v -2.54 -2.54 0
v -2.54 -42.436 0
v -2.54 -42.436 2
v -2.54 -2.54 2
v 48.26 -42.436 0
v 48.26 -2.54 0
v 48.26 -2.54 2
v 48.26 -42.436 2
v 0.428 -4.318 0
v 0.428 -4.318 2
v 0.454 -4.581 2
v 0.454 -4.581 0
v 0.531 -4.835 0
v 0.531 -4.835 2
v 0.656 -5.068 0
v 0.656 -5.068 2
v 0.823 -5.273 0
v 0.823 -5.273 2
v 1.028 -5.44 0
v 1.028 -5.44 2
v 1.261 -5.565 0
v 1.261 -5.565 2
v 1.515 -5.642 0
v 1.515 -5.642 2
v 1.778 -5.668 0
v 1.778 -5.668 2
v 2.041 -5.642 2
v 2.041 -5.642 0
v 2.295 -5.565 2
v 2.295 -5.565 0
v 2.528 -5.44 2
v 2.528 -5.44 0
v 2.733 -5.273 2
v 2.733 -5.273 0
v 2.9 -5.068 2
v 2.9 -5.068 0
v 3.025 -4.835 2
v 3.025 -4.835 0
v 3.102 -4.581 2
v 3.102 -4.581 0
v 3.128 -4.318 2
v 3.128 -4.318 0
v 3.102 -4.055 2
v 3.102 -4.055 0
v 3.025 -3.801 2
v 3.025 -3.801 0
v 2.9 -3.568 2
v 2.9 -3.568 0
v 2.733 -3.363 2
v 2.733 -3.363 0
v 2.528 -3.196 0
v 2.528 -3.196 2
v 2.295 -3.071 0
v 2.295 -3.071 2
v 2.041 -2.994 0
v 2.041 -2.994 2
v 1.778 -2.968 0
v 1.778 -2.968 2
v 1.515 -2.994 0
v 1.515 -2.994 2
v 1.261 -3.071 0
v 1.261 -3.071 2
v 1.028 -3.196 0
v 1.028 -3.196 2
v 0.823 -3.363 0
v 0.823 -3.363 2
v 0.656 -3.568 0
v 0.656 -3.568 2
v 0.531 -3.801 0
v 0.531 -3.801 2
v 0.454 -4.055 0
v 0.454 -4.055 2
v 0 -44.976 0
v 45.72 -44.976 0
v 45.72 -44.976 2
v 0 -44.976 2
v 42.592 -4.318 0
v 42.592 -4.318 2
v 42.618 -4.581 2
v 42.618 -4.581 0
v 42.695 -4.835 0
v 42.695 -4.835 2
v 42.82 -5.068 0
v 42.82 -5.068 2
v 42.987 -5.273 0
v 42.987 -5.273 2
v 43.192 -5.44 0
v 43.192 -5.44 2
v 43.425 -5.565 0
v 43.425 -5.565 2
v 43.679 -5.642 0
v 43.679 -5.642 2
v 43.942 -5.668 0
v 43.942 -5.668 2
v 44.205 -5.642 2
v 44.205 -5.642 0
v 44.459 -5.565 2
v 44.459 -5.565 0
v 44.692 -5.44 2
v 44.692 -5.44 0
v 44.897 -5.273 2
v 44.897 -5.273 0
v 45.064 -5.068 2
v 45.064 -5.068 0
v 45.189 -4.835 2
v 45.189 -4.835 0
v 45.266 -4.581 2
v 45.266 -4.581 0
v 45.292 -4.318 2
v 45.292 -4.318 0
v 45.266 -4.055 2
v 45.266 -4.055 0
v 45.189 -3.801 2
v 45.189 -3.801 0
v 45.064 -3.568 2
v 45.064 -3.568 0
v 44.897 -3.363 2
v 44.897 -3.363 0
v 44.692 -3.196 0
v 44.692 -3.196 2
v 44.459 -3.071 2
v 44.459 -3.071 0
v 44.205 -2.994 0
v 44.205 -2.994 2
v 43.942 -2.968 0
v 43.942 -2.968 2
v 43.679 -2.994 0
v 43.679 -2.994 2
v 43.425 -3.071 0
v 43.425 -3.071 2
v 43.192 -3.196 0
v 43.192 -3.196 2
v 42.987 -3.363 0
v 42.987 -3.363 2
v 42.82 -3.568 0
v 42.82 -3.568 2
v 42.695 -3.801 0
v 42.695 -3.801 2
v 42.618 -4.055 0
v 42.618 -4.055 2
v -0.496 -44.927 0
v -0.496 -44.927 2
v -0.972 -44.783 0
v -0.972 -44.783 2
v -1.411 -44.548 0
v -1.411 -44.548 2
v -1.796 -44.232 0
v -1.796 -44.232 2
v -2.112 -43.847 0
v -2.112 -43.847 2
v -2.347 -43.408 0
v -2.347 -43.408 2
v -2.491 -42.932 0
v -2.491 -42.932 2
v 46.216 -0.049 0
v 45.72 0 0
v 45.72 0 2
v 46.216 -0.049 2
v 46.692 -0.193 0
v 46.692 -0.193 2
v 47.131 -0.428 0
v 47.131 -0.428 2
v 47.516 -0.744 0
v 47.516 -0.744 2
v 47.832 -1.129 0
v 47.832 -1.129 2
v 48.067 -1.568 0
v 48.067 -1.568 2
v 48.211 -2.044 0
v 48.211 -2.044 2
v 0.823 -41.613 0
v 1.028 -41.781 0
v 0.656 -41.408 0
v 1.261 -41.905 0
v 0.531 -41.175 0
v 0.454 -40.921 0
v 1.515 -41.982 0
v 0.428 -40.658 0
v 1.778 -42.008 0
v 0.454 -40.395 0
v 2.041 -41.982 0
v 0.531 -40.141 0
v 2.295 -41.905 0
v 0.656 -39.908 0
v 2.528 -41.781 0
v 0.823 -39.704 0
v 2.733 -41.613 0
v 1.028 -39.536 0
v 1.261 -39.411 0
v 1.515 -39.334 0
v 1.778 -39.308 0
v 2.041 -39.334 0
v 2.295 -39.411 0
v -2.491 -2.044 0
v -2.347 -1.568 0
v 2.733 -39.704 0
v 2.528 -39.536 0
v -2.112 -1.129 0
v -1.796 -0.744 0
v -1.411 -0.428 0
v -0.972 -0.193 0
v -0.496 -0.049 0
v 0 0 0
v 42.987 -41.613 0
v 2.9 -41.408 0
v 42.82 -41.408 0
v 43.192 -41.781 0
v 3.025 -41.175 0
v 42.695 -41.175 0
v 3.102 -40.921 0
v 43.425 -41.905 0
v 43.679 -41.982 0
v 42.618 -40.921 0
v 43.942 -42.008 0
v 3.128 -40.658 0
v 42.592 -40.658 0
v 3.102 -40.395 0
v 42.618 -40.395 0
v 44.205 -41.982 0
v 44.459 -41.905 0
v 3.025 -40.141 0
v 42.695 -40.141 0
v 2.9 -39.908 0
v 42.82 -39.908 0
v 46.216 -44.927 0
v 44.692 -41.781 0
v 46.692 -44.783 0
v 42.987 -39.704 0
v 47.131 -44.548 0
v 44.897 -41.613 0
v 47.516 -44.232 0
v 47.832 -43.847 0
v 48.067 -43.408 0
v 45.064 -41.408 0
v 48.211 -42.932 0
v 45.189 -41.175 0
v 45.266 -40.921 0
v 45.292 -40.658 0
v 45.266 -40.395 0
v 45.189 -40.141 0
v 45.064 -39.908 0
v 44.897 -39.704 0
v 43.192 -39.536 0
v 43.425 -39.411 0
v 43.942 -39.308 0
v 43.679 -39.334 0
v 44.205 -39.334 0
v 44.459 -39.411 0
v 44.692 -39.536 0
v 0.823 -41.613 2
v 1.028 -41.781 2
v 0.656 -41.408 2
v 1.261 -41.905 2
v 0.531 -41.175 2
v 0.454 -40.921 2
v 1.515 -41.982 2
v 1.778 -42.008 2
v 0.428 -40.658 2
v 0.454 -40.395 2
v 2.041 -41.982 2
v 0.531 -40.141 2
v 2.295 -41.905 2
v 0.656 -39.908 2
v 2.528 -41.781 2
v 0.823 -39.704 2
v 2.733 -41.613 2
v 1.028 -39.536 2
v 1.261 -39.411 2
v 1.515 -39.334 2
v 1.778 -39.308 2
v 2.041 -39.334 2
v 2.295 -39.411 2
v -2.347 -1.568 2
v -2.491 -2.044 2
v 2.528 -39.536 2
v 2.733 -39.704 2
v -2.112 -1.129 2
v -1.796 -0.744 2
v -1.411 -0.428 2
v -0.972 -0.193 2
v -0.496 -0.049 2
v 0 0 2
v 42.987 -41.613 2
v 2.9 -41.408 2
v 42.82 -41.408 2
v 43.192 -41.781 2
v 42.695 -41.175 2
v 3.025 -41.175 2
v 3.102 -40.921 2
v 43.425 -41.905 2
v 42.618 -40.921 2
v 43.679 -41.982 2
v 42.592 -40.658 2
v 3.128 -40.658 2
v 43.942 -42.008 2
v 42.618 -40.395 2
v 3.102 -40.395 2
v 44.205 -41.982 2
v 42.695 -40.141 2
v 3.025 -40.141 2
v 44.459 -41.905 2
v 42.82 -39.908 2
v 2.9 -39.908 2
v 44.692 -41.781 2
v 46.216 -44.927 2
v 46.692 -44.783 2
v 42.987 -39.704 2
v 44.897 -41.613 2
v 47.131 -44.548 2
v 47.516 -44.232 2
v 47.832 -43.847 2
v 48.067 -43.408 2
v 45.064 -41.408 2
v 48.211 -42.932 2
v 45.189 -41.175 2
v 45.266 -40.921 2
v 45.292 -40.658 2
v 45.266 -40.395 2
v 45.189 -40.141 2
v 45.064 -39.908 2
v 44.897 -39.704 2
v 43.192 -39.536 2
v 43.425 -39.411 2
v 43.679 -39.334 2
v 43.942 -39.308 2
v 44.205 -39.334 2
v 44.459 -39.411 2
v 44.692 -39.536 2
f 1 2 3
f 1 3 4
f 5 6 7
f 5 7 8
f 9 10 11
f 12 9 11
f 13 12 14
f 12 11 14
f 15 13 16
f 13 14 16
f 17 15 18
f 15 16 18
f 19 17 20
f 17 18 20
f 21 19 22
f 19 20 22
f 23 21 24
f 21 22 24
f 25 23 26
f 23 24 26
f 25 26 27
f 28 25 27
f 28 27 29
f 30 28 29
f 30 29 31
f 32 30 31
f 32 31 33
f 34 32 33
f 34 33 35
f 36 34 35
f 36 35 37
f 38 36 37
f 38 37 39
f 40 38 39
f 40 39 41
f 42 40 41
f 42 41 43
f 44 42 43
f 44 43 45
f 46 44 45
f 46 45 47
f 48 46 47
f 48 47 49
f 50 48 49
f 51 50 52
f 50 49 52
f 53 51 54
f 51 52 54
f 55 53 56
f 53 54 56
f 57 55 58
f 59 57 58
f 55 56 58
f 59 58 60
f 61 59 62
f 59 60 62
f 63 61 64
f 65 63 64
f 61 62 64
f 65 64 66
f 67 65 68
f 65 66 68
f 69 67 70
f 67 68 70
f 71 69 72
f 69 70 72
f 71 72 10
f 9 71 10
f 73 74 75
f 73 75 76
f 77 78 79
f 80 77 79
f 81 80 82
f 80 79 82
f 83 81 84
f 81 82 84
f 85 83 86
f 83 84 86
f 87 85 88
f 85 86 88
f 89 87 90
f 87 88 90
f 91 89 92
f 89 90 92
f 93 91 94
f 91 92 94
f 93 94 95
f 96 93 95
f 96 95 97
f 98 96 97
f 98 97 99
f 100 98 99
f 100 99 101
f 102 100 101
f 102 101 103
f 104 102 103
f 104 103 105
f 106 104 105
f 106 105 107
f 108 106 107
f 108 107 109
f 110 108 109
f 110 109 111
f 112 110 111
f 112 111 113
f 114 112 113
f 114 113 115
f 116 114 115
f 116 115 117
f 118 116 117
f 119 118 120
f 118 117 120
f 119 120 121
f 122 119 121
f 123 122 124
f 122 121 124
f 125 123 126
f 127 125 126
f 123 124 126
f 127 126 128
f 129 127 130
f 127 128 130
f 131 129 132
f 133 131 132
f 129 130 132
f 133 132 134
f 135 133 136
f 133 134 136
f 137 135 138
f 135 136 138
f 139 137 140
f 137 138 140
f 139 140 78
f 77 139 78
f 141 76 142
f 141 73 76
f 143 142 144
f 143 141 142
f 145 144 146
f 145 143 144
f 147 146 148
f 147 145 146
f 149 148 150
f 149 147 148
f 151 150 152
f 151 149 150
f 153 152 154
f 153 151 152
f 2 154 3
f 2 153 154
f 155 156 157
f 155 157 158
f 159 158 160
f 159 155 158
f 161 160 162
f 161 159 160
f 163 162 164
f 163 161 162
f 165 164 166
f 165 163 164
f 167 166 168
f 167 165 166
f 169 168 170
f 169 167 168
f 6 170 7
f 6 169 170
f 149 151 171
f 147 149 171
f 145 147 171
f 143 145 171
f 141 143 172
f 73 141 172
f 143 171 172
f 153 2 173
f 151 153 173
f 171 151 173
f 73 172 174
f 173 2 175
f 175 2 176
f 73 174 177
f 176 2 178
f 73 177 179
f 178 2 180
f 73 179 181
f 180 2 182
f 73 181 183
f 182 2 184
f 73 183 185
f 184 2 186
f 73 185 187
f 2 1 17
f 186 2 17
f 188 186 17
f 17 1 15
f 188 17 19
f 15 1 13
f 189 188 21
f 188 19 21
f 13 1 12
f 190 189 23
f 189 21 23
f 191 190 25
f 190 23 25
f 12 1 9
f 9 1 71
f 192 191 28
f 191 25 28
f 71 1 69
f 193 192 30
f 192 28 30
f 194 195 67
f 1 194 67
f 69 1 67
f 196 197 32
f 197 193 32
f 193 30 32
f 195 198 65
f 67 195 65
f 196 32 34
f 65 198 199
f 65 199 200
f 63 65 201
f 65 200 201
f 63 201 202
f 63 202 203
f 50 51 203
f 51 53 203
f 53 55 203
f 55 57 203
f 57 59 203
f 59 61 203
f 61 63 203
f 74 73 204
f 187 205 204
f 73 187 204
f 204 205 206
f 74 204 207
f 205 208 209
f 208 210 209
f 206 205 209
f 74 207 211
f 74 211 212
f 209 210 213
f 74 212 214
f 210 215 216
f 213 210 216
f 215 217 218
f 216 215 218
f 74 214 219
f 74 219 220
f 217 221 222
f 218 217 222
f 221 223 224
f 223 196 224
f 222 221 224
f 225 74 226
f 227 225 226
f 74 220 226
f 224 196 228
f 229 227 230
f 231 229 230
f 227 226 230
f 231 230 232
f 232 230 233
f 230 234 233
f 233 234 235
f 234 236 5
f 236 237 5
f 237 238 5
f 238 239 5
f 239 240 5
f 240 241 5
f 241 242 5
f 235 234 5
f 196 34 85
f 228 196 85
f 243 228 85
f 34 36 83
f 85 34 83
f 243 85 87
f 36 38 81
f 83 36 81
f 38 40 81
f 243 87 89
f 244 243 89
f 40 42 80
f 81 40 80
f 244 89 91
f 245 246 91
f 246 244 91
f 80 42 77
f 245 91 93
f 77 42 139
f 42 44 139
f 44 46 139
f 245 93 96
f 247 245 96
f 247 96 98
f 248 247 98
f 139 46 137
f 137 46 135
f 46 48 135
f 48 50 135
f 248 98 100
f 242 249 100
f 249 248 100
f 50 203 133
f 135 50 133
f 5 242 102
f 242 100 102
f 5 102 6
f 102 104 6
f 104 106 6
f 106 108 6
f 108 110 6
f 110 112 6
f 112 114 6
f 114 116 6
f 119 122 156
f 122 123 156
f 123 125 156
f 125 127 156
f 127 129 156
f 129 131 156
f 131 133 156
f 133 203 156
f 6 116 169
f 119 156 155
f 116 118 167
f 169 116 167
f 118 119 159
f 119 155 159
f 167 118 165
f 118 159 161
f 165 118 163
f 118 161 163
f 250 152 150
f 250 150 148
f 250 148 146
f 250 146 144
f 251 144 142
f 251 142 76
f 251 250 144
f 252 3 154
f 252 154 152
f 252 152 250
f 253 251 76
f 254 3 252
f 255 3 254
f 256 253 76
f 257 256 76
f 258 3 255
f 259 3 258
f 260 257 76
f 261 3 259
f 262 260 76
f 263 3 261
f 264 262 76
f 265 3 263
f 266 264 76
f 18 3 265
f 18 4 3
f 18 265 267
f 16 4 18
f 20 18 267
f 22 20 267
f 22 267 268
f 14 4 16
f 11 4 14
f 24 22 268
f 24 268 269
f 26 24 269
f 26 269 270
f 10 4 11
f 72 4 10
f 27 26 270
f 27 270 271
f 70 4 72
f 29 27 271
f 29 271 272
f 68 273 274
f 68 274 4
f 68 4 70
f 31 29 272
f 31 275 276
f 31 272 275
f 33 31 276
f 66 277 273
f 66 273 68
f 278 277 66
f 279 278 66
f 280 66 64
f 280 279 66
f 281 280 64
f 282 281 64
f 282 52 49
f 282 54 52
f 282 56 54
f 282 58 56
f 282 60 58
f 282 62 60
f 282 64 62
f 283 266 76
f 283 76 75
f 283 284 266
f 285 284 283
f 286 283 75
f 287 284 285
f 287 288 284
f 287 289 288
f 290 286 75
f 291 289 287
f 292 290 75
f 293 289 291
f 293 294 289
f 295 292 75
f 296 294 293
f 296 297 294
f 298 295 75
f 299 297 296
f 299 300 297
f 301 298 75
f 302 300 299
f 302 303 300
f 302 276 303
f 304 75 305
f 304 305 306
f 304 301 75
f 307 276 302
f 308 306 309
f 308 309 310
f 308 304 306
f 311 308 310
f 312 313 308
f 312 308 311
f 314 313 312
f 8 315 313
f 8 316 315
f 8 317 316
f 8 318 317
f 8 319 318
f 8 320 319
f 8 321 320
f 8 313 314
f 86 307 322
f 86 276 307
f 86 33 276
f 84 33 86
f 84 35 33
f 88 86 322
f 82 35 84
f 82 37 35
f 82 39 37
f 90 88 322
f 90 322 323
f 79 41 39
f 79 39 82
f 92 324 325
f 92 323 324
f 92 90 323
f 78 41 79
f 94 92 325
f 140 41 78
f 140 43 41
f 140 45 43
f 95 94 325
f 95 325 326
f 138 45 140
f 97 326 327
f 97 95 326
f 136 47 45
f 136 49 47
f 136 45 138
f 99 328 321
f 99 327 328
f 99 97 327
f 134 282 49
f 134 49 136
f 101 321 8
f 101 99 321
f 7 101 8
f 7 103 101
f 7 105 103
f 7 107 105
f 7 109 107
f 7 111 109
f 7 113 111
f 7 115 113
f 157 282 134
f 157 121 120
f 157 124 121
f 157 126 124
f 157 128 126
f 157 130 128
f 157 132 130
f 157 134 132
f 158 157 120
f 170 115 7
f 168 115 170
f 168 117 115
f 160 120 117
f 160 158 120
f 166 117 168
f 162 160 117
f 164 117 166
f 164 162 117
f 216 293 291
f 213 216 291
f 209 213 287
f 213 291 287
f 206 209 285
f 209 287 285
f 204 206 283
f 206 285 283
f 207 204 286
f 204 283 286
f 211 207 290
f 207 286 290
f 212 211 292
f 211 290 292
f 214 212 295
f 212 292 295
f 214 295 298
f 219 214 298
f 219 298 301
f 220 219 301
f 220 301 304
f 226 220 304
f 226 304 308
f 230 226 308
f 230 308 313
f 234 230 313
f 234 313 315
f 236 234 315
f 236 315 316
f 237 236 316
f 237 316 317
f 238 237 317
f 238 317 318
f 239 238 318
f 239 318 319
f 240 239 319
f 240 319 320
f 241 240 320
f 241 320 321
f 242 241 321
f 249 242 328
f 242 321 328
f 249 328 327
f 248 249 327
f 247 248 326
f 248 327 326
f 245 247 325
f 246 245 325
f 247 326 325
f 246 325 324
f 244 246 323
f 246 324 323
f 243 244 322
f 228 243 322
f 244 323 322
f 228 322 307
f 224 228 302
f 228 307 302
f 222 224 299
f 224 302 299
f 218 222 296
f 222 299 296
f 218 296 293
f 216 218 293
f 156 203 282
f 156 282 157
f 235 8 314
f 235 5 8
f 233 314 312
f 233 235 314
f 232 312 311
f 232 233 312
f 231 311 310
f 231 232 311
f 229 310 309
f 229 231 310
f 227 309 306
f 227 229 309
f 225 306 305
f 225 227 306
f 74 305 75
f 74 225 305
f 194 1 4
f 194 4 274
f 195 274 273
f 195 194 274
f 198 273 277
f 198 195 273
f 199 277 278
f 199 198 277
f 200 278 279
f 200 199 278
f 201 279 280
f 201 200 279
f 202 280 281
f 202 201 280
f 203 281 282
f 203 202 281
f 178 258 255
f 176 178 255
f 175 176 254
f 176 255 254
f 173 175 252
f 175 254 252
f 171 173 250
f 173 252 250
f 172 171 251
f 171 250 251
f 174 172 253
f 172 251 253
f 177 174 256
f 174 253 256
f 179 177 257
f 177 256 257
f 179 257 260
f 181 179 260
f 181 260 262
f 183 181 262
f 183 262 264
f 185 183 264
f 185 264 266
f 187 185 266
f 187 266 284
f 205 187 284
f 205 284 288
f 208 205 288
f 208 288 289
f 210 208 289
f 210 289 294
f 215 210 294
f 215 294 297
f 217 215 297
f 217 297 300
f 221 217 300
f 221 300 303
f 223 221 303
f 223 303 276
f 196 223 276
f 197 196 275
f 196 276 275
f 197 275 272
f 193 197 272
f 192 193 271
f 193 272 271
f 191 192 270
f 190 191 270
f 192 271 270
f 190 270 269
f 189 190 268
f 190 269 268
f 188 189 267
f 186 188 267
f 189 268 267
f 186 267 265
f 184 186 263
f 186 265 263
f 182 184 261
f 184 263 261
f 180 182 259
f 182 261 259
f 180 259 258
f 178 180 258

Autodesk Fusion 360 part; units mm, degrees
sketch "Sketch10" plane through (0, 0, 0) normal (0, 0, 1) x (1, 0, 0)
  line L0 (0, 0) -> (45.72, 0)
  arc A0 (48.26, -2.54) -> (45.72, 0) centre (45.72, -2.54) ccw
  line L1 (45.72, -2.54) -> (48.26, -2.54) construction
  line L2 (45.72, -2.54) -> (45.72, 0) construction
  line L3 (48.26, -2.54) -> (48.26, -42.4361)
  arc A1 (48.26, -2.54) -> (45.72, 0) centre (45.72, -2.54) ccw
  arc A2 (45.72, -44.9761) -> (48.26, -42.4361) centre (45.72, -42.4361) ccw
  line L4 (0, -42.4361) -> (-2.54, -42.4361) construction
  line L5 (45.72, -44.9761) -> (0, -44.9761)
  arc A3 (-2.54, -42.4361) -> (0, -44.9761) centre (0, -42.4361) ccw
  arc A4 (-2.54, -42.4361) -> (0, -44.9761) centre (0, -42.4361) ccw
  line L6 (0, -42.4361) -> (0, -44.9761) construction
  arc A5 (0, 0) -> (-2.54, -2.54) centre (0, -2.54) ccw
  line L7 (-2.54, -42.4361) -> (-2.54, -2.54)
  point P0 (45.72, -44.9761)
  dimension "d5" = 45.72
  dimension "d7" = 2.54
  dimension "d8" = 90
  dimension "d9" = 39.8961
  dimension "d10" = 2.54
  dimension "d11" = 2.54
  dimension "d12" = 45.72
  dimension "d13" = 2.54
  dimension "d14" = 90
  dimension "d15" = 39.8961
  dimension "d16" = 2.54
  dimension "d17" = 2.54
extrude "Extrude3" add sketch "Sketch10" along normal blind 2
sketch "Sketch11" plane through (0, 0, 2) normal (0, 0, 1) x (-1, 0, 0)
  arc A0 (-45.72, 44.9761) -> (-48.26, 42.4361) centre (-45.72, 42.4361) ccw
  line L0 (-48.26, 42.4361) -> (-48.26, 2.54)
  arc A1 (-48.26, 2.54) -> (-45.72, 0) centre (-45.72, 2.54) ccw
  line L1 (-45.72, 0) -> (0, 0)
  arc A2 (0, 0) -> (2.54, 2.54) centre (0, 2.54) ccw
  line L2 (2.54, 2.54) -> (2.54, 42.4361)
  arc A3 (2.54, 42.4361) -> (0, 44.9761) centre (0, 42.4361) ccw
  line L3 (0, 44.9761) -> (-45.72, 44.9761)
  circle A4 centre (-1.778, 4.318) radius 1.35
  dimension "d22" = 2.7
extrude "Extrude4" cut sketch "Sketch11" against normal blind 4 contours A4
sketch "Sketch12" plane through (0, 0, 2) normal (0, 0, 1) x (-1, 0, 0)
  circle A0 centre (-1.778, 4.318) radius 1.35
  arc A1 (-45.72, 44.9761) -> (-48.26, 42.4361) centre (-45.72, 42.4361) ccw
  line L0 (-48.26, 42.4361) -> (-48.26, 2.54)
  arc A2 (-48.26, 2.54) -> (-45.72, 0) centre (-45.72, 2.54) ccw
  line L1 (-45.72, 0) -> (0, 0)
  arc A3 (0, 0) -> (2.54, 2.54) centre (0, 2.54) ccw
  line L2 (2.54, 2.54) -> (2.54, 42.4361)
  arc A4 (2.54, 42.4361) -> (0, 44.9761) centre (0, 42.4361) ccw
  line L3 (0, 44.9761) -> (-45.72, 44.9761)
  circle A5 centre (-43.942, 4.318) radius 1.35
  dimension "d27" = 2.7
extrude "Extrude5" cut sketch "Sketch12" against normal blind 4 contours A5
sketch "Sketch13" plane through (0, 0, 2) normal (0, 0, 1) x (-1, 0, 0)
  circle A0 centre (-43.942, 4.318) radius 1.35
  circle A1 centre (-1.778, 4.318) radius 1.35
  arc A2 (-45.72, 44.9761) -> (-48.26, 42.4361) centre (-45.72, 42.4361) ccw
  line L0 (-48.26, 42.4361) -> (-48.26, 2.54)
  arc A3 (-48.26, 2.54) -> (-45.72, 0) centre (-45.72, 2.54) ccw
  line L1 (-45.72, 0) -> (0, 0)
  arc A4 (0, 0) -> (2.54, 2.54) centre (0, 2.54) ccw
  line L2 (2.54, 2.54) -> (2.54, 42.4361)
  arc A5 (2.54, 42.4361) -> (0, 44.9761) centre (0, 42.4361) ccw
  line L3 (0, 44.9761) -> (-45.72, 44.9761)
  circle A6 centre (-1.778, 40.6581) radius 1.35
  dimension "d32" = 2.7
extrude "Extrude6" cut sketch "Sketch13" against normal blind 4 contours A6
sketch "Sketch14" plane through (0, 0, 2) normal (0, 0, 1) x (-1, 0, 0)
  circle A0 centre (-1.778, 40.6581) radius 1.35
  circle A1 centre (-43.942, 4.318) radius 1.35
  circle A2 centre (-1.778, 4.318) radius 1.35
  arc A3 (-45.72, 44.9761) -> (-48.26, 42.4361) centre (-45.72, 42.4361) ccw
  line L0 (-48.26, 42.4361) -> (-48.26, 2.54)
  arc A4 (-48.26, 2.54) -> (-45.72, 0) centre (-45.72, 2.54) ccw
  line L1 (-45.72, 0) -> (0, 0)
  arc A5 (0, 0) -> (2.54, 2.54) centre (0, 2.54) ccw
  line L2 (2.54, 2.54) -> (2.54, 42.4361)
  arc A6 (2.54, 42.4361) -> (0, 44.9761) centre (0, 42.4361) ccw
  line L3 (0, 44.9761) -> (-45.72, 44.9761)
  circle A7 centre (-43.942, 40.6581) radius 1.35
  dimension "d37" = 2.7
extrude "Extrude7" cut sketch "Sketch14" against normal blind 4 contours A7
sketch "Sketch15" plane through (0, 0, 2) normal (0, 0, 1) x (-1, 0, 0)
  circle A0 centre (-43.942, 40.6581) radius 1.35
  circle A1 centre (-1.778, 40.6581) radius 1.35
  circle A2 centre (-43.942, 4.318) radius 1.35
  circle A3 centre (-1.778, 4.318) radius 1.35
  arc A4 (-45.72, 44.9761) -> (-48.26, 42.4361) centre (-45.72, 42.4361) ccw
  line L0 (-48.26, 42.4361) -> (-48.26, 2.54)
  arc A5 (-48.26, 2.54) -> (-45.72, 0) centre (-45.72, 2.54) ccw
  line L1 (-45.72, 0) -> (0, 0)
  arc A6 (0, 0) -> (2.54, 2.54) centre (0, 2.54) ccw
  line L2 (2.54, 2.54) -> (2.54, 42.4361)
  arc A7 (2.54, 42.4361) -> (0, 44.9761) centre (0, 42.4361) ccw
  line L3 (0, 44.9761) -> (-45.72, 44.9761)
  line L4 (-4.96, 7.5) -> (-40.76, 7.5)
  line L5 (-40.76, 7.5) -> (-40.76, 37.4761)
  line L6 (-40.76, 37.4761) -> (-4.96, 37.4761)
  line L7 (-4.96, 37.4761) -> (-4.96, 7.5)
